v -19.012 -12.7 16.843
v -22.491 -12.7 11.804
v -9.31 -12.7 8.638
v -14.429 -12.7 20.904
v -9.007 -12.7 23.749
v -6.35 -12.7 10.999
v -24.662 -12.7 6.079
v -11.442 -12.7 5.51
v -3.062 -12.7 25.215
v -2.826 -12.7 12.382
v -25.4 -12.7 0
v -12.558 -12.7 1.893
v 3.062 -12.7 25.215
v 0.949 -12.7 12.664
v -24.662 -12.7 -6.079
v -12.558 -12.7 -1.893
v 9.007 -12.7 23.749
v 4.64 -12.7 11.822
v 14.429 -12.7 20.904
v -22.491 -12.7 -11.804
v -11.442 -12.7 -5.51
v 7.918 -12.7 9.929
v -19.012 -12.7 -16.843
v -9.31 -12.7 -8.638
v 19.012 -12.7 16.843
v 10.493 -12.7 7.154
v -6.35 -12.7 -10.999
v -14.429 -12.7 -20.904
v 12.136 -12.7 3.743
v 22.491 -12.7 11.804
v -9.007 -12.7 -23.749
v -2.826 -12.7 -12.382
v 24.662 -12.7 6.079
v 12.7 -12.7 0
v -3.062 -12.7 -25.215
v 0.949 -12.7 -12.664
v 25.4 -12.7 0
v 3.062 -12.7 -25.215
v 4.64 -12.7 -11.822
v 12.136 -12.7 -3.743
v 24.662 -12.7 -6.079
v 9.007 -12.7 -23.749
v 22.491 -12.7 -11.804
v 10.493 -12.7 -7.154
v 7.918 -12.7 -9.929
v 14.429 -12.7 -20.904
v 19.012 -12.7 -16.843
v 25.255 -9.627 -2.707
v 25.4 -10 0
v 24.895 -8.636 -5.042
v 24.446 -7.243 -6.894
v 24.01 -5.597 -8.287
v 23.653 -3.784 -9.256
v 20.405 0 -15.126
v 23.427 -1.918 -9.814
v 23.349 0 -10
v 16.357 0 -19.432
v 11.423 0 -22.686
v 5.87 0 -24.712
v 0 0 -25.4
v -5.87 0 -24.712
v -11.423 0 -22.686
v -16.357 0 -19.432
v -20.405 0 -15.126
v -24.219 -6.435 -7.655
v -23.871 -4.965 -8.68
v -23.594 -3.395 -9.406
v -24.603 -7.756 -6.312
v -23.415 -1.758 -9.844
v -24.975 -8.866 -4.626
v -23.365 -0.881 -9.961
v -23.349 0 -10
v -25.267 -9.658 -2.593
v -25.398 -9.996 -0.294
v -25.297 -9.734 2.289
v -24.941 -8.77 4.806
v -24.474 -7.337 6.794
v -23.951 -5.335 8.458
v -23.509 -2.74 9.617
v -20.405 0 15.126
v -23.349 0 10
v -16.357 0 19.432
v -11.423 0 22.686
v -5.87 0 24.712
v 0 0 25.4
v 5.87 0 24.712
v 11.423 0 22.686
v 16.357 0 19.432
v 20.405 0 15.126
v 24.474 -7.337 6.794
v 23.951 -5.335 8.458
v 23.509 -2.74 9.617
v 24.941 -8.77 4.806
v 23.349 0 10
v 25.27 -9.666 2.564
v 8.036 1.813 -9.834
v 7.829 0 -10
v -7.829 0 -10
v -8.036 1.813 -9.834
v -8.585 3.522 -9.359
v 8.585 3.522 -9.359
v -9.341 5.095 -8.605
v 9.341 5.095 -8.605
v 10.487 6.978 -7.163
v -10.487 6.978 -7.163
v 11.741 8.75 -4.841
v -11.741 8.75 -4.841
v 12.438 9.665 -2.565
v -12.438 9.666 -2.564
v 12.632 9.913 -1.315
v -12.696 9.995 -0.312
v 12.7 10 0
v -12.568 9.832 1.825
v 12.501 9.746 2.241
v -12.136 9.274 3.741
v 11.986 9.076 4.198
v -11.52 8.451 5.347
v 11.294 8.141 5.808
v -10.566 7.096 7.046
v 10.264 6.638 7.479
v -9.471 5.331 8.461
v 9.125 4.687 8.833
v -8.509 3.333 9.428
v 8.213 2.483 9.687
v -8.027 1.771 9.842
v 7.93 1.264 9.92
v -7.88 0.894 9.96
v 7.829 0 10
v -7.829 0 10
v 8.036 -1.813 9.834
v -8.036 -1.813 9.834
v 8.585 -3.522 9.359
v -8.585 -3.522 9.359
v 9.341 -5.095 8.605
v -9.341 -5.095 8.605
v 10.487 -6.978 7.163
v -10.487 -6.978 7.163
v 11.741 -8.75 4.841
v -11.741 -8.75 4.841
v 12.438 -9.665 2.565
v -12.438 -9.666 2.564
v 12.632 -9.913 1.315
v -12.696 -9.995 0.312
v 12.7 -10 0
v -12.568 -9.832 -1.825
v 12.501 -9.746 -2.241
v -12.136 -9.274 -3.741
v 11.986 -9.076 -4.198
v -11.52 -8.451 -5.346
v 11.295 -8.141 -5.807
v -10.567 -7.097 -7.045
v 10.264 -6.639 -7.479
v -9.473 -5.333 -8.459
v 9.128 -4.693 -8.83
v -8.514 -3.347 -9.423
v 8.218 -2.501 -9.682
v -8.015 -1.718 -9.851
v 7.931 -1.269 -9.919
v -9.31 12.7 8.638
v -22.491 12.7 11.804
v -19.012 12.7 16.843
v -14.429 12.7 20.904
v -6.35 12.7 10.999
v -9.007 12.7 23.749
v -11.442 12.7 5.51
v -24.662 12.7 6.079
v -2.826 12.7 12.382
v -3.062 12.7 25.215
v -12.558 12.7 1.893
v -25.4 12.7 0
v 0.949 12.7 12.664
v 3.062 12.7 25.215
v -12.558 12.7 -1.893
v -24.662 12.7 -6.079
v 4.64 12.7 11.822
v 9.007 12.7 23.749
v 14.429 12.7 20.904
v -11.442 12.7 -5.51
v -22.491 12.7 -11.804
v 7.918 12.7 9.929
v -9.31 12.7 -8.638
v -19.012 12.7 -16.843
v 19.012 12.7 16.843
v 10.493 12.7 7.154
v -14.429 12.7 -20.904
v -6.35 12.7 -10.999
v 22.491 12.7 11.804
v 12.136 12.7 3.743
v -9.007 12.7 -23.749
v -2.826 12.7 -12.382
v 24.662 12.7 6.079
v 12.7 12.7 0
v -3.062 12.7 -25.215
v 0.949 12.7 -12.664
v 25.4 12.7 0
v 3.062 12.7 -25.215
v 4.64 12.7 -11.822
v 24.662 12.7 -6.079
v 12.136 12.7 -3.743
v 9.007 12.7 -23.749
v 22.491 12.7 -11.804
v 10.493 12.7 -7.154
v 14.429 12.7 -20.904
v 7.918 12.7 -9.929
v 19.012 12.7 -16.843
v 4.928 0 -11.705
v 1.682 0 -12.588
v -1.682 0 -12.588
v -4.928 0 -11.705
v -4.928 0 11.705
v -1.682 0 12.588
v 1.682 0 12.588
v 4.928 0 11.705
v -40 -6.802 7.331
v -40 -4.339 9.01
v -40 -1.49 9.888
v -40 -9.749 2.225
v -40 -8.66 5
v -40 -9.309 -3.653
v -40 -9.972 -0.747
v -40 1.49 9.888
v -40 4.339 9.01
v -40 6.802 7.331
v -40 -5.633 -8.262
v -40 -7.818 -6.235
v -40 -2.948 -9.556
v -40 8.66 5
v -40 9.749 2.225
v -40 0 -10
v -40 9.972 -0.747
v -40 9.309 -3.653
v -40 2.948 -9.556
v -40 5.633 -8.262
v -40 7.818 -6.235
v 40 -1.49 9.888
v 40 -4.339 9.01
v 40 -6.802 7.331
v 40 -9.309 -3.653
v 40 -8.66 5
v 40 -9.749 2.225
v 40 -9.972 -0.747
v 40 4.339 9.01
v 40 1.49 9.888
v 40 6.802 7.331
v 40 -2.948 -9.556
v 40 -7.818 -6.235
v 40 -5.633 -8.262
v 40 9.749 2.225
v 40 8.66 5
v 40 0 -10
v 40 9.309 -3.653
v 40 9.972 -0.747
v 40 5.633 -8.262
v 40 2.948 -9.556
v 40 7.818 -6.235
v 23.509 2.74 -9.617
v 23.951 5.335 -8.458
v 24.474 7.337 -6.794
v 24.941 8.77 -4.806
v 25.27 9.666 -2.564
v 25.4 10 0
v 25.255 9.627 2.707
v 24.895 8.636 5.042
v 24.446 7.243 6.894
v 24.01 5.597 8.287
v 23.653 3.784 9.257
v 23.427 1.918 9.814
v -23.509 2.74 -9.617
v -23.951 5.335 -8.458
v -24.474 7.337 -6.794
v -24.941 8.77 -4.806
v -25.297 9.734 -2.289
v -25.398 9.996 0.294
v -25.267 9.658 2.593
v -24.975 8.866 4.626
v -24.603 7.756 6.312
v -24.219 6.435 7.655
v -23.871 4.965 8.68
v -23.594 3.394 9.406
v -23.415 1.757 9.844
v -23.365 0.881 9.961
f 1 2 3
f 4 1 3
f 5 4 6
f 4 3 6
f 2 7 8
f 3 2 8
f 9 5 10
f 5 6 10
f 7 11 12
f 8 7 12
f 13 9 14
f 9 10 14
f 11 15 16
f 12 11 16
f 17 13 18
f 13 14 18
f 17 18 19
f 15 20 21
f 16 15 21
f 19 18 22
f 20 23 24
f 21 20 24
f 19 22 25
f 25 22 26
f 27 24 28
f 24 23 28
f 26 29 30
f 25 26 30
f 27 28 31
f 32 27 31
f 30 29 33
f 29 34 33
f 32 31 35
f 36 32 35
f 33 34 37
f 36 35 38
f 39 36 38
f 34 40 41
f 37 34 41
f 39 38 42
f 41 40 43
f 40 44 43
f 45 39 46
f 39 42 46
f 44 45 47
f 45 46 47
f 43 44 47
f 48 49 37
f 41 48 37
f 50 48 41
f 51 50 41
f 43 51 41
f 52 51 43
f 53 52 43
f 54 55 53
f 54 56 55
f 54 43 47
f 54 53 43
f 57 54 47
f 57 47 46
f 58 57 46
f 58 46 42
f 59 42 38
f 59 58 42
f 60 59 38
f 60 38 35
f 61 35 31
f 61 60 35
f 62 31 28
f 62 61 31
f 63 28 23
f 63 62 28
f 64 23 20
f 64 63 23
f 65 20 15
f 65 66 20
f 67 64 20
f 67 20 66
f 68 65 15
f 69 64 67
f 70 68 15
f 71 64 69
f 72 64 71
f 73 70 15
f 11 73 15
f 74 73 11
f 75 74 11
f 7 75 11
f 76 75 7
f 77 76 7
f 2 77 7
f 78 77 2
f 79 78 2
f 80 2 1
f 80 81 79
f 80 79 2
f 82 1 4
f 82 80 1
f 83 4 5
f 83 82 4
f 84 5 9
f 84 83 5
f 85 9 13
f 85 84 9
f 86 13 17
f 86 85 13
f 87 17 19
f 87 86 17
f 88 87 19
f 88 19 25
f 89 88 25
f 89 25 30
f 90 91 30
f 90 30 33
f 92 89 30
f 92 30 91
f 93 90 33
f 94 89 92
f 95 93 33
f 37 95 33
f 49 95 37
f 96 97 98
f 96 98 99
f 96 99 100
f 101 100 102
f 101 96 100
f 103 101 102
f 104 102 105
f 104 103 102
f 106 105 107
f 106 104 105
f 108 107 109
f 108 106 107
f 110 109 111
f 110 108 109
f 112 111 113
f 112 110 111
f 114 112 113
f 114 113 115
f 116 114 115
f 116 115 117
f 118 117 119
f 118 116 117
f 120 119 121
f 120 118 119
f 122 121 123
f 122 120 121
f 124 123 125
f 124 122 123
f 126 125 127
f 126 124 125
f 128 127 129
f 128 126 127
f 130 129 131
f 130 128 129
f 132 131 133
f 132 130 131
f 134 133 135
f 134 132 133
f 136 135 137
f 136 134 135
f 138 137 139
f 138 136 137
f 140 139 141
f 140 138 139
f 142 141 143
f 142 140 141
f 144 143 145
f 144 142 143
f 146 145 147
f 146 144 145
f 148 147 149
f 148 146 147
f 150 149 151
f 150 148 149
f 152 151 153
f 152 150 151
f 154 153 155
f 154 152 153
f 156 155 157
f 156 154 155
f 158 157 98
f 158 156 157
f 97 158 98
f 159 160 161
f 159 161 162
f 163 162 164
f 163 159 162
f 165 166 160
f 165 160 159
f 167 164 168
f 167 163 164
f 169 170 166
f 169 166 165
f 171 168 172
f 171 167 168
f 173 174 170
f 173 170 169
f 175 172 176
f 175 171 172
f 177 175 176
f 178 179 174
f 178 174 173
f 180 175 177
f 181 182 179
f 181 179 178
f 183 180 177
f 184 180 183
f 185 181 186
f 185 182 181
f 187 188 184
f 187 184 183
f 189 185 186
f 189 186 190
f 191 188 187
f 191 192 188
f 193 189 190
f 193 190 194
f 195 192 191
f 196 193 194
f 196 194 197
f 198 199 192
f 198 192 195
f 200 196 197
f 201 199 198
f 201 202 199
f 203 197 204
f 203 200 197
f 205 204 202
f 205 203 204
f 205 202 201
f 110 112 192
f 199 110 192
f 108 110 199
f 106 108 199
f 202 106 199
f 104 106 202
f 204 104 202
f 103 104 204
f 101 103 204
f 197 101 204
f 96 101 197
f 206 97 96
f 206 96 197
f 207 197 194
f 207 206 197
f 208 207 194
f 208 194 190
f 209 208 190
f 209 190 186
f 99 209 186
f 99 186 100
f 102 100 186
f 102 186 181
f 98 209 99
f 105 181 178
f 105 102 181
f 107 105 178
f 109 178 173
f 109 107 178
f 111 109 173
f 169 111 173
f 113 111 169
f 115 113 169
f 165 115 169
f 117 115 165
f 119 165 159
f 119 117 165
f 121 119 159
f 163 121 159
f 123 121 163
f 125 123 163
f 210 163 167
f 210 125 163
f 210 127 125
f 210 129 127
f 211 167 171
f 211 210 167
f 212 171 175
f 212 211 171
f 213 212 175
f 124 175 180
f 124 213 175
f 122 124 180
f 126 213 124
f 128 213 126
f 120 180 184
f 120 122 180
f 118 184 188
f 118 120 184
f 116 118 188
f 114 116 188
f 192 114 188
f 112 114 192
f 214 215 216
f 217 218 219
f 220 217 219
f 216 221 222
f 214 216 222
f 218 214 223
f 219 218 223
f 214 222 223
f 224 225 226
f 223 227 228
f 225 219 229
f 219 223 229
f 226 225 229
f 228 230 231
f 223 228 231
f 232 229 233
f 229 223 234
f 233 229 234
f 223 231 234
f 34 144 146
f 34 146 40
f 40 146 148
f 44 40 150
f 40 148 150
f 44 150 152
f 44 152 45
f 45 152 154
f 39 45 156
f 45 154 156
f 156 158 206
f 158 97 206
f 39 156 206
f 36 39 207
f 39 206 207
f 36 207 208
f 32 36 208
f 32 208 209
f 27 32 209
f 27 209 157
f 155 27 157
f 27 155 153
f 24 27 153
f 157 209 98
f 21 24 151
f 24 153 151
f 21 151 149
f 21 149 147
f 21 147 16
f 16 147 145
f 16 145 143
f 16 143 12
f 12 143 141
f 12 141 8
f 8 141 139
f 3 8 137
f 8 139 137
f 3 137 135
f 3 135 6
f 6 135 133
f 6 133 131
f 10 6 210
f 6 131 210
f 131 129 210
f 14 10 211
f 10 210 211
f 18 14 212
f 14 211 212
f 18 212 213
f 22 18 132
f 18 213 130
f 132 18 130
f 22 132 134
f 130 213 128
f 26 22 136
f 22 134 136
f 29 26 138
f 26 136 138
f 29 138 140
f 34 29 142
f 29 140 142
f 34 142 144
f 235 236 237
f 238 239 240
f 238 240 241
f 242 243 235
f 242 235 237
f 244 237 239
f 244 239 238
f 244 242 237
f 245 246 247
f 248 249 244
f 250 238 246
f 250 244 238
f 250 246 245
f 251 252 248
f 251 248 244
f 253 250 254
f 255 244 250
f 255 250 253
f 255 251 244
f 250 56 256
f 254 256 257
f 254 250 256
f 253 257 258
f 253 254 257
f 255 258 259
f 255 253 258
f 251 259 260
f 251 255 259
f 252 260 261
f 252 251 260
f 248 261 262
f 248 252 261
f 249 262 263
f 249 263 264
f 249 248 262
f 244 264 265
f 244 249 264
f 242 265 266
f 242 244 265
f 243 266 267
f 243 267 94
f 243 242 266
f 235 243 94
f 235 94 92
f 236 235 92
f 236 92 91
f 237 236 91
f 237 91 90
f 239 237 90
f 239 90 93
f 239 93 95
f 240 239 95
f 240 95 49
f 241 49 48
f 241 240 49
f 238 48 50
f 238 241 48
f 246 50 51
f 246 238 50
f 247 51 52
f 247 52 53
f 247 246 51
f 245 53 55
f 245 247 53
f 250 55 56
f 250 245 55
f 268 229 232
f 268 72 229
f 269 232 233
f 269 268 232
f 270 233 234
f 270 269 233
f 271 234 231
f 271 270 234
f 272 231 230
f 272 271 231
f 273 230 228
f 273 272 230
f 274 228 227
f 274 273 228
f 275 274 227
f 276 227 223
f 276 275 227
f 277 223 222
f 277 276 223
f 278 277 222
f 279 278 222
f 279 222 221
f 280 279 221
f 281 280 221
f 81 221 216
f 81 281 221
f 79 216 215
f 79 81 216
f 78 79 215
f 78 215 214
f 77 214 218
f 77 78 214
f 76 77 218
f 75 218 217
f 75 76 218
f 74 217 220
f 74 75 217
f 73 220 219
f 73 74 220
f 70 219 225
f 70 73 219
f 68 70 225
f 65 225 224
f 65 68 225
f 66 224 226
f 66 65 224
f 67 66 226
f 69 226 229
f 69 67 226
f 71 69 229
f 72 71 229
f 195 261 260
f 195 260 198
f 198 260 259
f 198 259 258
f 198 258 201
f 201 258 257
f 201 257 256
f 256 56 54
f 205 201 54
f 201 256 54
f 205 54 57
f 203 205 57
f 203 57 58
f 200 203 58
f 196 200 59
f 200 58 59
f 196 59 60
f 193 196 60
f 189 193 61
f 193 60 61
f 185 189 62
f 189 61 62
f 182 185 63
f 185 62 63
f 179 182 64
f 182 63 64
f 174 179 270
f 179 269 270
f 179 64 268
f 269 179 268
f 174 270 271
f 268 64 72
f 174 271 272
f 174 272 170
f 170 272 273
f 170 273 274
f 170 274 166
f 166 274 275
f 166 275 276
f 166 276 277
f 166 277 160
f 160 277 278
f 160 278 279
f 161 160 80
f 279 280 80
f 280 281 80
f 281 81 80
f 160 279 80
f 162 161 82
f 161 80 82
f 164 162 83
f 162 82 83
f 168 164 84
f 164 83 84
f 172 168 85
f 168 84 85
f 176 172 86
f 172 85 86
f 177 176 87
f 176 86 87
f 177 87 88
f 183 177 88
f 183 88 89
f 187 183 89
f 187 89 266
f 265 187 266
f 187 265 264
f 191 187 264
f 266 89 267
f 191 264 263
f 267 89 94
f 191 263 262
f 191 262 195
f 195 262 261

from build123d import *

# Parameters (mm, degrees)
BOSS_EXTRUDE1_DEPTH      = 40
BOSS_EXTRUDE1_DEPTH_BACK = 40
SKETCH2_R                = 10
BOSS_EXTRUDE2_DEPTH      = 12.7
BOSS_EXTRUDE2_DEPTH_BACK = 12.7
SKETCH1_R                = 25.4
SKETCH1_R_2              = 12.7


with BuildPart() as part:
    # Sketch2 → Boss-Extrude1 (new, two sides: drawn at the far end of the back side and taken through both)
    with BuildSketch(Plane(origin=(0, 0, 0), x_dir=(0, 0, -1), z_dir=(1, 0, 0)).offset(-BOSS_EXTRUDE1_DEPTH_BACK)):
        Circle(SKETCH2_R)
    extrude(amount=BOSS_EXTRUDE1_DEPTH + BOSS_EXTRUDE1_DEPTH_BACK)

    # Sketch1 → Boss-Extrude2 (add, two sides: drawn at the far end of the back side and taken through both)
    with BuildSketch(Plane(origin=(0, 0, 0), x_dir=(1, 0, 0), z_dir=(0, 1, 0)).offset(-BOSS_EXTRUDE2_DEPTH_BACK)):
        Circle(SKETCH1_R)
        Circle(SKETCH1_R_2, mode=Mode.SUBTRACT)
    extrude(amount=BOSS_EXTRUDE2_DEPTH + BOSS_EXTRUDE2_DEPTH_BACK)


solid = part.part
